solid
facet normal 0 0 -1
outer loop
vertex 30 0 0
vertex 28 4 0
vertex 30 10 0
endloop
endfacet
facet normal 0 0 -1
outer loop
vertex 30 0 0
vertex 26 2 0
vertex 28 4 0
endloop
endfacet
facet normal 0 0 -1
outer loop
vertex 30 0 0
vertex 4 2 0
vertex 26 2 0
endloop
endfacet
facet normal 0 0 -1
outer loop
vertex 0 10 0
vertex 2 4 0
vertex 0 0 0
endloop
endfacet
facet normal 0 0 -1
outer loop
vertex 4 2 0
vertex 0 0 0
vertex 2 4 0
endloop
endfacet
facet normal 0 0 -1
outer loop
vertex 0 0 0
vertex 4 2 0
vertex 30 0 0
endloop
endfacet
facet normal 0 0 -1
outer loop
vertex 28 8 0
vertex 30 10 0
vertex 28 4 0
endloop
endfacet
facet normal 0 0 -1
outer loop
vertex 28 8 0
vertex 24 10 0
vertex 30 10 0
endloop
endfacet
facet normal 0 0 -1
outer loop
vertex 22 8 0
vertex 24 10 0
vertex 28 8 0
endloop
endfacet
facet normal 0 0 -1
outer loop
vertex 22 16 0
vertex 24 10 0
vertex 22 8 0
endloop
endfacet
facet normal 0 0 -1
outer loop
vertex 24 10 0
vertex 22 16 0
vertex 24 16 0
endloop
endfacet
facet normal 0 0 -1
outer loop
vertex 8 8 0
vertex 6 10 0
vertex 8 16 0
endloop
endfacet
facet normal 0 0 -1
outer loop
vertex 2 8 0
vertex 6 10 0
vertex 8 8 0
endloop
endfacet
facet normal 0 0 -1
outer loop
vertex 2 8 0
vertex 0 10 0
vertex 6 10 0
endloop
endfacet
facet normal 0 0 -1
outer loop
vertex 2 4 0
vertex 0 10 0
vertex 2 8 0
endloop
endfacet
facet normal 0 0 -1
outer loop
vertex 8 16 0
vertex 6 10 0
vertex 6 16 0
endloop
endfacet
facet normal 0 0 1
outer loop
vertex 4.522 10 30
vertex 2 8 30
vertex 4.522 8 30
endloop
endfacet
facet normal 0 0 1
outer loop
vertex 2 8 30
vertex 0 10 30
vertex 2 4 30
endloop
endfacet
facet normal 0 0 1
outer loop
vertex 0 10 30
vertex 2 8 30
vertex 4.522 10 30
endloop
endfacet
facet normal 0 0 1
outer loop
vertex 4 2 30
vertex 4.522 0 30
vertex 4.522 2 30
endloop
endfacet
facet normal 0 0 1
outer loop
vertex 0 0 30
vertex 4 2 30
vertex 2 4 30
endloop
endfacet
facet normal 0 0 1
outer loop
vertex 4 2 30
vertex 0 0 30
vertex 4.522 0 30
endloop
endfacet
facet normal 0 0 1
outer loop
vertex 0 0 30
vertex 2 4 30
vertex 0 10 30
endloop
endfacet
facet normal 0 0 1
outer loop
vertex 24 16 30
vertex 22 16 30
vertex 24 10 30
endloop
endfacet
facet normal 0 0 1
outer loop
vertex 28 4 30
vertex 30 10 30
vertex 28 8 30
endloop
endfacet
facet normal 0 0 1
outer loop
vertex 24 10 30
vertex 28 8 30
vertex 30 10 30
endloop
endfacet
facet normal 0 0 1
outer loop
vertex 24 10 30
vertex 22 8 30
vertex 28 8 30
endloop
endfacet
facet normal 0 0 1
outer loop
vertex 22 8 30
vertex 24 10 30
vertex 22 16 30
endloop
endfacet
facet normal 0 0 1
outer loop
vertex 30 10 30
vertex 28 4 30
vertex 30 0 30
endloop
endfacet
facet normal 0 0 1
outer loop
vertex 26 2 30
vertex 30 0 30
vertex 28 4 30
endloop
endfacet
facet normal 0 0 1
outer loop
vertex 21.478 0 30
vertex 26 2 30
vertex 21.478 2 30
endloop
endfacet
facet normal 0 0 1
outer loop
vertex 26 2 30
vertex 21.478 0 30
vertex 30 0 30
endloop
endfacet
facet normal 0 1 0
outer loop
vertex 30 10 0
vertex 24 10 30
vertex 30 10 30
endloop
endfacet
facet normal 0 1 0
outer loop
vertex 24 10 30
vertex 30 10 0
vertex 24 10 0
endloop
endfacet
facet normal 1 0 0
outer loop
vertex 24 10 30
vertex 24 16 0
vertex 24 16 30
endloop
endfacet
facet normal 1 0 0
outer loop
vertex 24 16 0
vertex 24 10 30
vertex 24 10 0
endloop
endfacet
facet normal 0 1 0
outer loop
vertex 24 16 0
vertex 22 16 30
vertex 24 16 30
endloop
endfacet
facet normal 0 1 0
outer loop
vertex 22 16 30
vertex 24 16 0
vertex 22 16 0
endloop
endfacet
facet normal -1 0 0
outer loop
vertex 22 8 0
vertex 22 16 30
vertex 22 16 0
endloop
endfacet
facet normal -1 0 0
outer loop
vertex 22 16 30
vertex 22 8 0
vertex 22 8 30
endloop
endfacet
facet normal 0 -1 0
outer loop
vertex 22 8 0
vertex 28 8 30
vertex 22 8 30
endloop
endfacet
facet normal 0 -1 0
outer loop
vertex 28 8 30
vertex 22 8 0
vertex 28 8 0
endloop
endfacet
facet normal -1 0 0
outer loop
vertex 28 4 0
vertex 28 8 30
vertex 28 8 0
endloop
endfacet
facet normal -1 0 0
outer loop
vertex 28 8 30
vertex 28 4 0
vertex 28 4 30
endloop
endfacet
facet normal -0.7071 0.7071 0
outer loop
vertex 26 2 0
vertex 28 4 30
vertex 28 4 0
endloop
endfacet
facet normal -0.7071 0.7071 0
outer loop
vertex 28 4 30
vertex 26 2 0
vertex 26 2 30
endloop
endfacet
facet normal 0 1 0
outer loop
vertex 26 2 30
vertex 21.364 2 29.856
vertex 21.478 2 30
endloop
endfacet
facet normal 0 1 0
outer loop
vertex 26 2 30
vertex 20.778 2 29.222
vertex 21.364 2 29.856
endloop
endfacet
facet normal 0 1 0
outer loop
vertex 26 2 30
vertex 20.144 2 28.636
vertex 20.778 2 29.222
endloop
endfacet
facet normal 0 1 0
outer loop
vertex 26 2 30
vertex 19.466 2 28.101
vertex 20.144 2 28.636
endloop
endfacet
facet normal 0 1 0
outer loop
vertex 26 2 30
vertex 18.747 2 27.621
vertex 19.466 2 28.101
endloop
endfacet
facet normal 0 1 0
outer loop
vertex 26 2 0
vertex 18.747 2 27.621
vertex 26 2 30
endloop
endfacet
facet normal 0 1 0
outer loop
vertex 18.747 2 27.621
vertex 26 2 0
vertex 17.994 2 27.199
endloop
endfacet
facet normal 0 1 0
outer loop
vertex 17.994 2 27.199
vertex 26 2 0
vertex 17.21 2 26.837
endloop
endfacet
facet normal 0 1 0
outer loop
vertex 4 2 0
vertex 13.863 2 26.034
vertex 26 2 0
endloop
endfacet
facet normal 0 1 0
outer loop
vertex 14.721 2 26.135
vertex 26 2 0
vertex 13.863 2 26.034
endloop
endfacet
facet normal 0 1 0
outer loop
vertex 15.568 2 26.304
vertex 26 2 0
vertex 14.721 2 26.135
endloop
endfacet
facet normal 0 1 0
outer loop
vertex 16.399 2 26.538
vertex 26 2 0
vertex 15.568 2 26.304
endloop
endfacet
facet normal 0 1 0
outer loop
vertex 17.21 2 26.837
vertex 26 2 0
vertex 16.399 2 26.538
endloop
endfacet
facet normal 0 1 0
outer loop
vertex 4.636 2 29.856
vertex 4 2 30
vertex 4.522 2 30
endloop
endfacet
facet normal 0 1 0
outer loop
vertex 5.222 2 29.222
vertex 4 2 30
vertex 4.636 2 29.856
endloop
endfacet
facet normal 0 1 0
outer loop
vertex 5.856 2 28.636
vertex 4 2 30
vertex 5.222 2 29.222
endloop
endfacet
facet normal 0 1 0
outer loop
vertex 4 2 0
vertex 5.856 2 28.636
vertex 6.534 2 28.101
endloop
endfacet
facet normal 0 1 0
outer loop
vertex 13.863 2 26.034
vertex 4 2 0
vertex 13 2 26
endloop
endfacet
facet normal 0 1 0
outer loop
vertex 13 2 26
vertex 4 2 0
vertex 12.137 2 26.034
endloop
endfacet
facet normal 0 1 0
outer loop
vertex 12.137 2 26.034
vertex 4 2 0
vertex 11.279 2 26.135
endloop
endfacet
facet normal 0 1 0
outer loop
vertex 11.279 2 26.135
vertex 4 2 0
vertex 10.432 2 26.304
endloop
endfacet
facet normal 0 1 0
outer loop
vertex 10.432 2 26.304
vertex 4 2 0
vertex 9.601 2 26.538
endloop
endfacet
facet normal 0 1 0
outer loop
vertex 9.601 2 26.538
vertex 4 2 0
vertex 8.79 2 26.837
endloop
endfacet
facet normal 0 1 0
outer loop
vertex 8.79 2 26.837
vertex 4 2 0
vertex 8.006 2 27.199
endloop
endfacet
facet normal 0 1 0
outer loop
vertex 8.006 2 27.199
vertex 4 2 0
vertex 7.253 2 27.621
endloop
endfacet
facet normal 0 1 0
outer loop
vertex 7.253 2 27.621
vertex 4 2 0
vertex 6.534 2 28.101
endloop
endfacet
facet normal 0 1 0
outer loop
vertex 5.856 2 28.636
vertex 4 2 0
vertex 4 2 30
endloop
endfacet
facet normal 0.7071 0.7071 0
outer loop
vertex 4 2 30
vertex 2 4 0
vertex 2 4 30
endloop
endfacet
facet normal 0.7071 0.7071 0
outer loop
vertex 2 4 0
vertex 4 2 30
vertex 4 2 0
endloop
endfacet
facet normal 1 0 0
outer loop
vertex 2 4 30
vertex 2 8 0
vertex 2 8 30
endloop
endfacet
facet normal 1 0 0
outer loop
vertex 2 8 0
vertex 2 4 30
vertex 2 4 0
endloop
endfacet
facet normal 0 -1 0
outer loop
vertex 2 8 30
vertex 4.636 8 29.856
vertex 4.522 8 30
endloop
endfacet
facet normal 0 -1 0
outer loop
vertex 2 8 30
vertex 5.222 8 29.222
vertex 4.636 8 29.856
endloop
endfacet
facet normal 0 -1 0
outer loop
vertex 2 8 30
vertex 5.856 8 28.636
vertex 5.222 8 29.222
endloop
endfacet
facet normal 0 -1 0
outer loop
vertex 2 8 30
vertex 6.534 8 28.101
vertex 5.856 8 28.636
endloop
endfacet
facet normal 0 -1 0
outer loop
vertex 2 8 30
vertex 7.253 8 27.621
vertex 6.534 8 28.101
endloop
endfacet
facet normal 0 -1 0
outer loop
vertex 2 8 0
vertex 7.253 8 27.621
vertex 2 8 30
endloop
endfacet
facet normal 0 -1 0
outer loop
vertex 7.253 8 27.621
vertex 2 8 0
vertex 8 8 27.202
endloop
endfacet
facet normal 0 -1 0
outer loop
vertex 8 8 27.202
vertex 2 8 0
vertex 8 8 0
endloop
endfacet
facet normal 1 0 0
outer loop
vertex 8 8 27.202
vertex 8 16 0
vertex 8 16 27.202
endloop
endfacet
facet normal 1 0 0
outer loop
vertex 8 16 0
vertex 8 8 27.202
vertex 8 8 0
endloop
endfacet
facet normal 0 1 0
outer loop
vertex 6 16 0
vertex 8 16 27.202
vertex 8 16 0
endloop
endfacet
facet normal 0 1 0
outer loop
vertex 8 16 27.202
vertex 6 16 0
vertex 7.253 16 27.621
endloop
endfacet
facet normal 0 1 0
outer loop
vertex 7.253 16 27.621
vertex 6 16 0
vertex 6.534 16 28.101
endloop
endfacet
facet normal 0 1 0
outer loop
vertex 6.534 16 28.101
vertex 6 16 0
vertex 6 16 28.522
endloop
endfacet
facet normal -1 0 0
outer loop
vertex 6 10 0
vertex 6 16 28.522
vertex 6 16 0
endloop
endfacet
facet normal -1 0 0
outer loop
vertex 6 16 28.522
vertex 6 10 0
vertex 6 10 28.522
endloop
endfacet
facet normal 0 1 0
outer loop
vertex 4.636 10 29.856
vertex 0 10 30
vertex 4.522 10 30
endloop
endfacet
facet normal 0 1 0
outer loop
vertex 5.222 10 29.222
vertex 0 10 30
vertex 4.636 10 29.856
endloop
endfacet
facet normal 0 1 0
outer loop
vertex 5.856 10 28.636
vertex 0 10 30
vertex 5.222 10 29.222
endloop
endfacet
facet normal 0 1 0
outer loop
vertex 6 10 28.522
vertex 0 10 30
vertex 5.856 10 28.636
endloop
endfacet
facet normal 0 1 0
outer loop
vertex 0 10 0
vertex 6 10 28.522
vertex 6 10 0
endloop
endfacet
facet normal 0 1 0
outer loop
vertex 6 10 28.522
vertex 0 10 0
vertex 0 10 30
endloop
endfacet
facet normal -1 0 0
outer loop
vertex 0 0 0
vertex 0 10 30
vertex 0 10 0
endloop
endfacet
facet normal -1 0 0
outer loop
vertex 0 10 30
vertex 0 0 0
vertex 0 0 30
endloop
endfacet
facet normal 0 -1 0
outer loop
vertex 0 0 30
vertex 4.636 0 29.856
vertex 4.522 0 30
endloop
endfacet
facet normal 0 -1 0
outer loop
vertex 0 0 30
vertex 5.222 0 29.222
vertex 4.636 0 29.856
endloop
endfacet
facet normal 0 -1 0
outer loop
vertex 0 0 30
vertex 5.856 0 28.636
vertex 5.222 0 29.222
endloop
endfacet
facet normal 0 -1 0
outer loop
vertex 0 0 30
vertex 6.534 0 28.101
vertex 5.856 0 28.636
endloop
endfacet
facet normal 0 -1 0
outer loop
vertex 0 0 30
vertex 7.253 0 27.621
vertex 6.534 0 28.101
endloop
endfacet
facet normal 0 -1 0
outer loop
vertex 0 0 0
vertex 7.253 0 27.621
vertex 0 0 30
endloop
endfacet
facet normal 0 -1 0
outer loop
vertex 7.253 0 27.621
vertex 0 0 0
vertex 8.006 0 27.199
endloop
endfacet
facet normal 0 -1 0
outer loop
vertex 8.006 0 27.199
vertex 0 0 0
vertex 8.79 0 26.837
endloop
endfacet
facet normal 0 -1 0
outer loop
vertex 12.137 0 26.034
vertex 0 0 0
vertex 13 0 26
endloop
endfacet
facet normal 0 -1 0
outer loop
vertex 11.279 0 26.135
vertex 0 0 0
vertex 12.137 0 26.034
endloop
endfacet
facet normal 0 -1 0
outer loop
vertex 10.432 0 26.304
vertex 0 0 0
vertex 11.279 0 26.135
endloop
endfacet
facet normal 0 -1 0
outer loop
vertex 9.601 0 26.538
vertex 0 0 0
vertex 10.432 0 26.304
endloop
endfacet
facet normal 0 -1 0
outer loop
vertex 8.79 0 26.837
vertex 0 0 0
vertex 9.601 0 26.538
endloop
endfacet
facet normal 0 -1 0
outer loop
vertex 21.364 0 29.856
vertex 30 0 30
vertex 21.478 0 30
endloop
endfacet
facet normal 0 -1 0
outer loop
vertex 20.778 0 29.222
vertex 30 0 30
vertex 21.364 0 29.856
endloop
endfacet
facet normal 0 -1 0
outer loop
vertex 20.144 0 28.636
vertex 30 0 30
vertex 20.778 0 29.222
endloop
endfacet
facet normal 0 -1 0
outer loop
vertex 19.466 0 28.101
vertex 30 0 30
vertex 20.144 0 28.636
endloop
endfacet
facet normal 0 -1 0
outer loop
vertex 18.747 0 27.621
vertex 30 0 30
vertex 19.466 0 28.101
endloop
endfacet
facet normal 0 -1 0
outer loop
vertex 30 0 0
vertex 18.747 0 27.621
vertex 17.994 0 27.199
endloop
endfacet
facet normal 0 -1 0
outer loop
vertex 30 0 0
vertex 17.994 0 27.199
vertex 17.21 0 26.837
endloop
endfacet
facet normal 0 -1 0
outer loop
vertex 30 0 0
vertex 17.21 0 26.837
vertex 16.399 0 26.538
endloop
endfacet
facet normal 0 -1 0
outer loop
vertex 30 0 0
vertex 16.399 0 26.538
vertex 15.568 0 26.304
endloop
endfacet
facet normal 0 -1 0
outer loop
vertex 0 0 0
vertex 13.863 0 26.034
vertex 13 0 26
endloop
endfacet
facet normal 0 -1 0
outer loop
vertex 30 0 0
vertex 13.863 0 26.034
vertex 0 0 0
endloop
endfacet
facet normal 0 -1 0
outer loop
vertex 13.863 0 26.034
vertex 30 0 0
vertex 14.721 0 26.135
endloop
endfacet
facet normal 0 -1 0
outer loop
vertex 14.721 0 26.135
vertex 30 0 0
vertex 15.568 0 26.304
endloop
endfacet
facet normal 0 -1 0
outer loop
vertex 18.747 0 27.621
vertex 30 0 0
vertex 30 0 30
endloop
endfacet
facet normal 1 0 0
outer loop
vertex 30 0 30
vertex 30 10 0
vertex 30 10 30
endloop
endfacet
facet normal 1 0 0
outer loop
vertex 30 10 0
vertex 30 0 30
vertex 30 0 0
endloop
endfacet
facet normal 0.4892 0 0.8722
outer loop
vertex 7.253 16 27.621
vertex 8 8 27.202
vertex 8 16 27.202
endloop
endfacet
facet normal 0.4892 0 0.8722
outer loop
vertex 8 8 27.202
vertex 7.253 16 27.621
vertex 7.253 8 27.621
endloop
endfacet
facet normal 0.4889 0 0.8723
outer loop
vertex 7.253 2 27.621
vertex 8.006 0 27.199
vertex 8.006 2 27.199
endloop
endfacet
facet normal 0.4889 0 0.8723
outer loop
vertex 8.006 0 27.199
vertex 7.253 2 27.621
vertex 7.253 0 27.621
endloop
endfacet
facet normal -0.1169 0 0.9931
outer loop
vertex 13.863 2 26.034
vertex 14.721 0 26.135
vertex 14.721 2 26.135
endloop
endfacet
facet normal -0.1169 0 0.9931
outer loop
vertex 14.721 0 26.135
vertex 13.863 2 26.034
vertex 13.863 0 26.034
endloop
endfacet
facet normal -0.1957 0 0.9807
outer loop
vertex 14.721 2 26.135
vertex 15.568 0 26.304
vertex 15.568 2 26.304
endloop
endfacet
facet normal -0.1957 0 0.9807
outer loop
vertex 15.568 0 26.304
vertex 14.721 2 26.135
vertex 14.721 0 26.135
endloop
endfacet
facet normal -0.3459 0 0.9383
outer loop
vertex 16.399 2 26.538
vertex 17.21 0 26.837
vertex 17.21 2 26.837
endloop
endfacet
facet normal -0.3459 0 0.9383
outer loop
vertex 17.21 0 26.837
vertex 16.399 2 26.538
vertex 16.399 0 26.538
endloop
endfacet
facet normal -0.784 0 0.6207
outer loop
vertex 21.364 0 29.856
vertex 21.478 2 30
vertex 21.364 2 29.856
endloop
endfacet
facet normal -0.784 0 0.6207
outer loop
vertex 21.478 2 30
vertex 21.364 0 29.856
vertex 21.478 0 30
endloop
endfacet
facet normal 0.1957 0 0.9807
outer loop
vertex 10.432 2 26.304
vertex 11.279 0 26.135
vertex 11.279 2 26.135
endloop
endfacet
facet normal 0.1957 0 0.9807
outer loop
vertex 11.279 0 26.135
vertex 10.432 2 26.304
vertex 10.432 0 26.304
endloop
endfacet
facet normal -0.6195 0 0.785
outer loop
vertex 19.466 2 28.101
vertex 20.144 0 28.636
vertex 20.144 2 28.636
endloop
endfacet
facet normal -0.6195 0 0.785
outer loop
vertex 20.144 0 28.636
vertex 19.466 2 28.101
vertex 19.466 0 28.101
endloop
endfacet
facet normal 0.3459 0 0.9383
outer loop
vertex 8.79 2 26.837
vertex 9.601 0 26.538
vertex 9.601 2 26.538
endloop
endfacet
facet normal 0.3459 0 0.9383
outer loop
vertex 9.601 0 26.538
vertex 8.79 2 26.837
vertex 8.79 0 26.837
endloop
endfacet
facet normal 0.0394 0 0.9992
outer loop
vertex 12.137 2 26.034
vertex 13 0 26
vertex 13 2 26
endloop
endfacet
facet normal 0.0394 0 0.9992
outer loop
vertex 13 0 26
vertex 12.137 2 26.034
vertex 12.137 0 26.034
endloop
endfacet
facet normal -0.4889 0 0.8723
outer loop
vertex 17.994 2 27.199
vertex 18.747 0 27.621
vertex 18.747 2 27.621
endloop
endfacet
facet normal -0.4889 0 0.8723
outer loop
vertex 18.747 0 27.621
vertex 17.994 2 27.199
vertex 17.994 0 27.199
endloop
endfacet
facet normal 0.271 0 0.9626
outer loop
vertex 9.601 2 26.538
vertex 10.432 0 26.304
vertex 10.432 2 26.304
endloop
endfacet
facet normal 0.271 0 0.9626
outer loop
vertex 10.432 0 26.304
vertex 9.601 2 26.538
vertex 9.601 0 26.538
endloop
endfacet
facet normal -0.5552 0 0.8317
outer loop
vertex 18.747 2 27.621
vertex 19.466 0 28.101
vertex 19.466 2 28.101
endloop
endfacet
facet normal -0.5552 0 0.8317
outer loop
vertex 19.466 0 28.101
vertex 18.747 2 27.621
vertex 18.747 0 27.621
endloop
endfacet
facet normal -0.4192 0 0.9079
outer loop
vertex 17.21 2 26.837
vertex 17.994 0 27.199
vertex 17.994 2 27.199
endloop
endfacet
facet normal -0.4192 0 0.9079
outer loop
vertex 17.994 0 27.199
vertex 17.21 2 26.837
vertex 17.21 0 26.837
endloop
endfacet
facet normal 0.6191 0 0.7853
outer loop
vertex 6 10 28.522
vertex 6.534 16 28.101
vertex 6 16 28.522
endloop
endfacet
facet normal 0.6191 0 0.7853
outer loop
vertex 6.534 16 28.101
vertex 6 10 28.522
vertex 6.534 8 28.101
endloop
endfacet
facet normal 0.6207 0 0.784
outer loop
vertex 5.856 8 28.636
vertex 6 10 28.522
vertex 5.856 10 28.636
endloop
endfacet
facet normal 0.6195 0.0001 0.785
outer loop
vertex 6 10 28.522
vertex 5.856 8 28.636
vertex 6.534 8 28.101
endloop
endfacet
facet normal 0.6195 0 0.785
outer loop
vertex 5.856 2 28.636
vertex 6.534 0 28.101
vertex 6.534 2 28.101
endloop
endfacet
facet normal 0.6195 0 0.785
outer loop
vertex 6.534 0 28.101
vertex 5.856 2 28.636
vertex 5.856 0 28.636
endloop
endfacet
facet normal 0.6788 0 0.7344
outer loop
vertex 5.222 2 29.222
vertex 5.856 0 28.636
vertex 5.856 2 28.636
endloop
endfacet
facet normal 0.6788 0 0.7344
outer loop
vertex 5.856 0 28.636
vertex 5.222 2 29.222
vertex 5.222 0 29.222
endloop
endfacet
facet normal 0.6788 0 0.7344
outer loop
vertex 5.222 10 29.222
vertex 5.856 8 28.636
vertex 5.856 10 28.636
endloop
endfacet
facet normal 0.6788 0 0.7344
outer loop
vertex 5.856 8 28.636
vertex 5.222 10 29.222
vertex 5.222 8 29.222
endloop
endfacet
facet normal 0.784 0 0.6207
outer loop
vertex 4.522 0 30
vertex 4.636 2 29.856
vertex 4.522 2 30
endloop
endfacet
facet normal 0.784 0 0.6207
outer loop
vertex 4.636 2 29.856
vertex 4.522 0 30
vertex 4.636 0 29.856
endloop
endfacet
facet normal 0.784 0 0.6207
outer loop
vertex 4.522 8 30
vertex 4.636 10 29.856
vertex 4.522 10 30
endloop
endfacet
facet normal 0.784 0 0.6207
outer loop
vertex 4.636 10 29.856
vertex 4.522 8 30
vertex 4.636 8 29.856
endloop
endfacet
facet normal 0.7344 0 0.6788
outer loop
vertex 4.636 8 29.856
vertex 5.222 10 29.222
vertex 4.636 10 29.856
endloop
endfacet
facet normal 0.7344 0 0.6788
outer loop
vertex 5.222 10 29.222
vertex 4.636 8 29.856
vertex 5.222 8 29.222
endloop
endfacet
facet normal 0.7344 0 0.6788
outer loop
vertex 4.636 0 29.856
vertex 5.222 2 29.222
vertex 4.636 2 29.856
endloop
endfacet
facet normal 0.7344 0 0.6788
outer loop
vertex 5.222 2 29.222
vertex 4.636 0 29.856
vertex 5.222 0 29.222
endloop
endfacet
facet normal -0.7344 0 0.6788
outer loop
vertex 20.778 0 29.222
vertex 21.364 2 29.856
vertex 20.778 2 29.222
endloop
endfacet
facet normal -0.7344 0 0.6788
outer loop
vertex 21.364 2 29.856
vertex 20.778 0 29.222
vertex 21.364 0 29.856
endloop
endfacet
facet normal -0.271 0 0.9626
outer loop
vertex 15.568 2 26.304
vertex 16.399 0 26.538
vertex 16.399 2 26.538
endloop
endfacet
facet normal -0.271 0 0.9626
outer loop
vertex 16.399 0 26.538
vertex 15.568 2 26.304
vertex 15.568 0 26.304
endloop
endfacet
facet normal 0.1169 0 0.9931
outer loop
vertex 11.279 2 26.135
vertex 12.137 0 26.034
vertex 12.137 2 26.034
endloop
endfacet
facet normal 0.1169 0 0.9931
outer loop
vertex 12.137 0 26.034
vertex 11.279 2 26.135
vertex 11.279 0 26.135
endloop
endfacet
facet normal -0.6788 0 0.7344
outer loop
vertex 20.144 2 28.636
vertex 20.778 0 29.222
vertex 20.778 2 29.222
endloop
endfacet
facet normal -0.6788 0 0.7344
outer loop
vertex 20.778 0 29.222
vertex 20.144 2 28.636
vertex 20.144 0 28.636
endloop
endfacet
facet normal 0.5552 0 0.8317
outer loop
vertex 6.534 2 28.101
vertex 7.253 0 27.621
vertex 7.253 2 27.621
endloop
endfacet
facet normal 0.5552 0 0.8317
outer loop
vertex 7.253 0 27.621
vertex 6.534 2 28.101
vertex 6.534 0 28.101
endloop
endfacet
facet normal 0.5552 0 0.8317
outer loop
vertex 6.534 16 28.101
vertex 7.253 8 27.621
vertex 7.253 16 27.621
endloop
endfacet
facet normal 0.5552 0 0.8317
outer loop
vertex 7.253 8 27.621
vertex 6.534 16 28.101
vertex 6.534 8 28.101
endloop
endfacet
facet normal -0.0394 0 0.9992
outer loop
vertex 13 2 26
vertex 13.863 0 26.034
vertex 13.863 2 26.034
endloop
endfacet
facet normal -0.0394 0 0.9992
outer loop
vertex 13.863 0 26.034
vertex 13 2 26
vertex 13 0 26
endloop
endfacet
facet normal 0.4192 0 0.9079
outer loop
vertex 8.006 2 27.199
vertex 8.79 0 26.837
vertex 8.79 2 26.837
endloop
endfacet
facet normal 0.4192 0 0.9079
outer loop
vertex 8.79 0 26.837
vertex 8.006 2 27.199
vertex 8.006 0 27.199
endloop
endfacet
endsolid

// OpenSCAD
//fun holder

points=[[6,16],[6,10],[0,10],[0,0],[30,0],[30,10],[24,10],[24,16],[22,16],[22,8],[28,8],[28,4],[26,2],[4,2],[2,4],[2,8],[8,8],[8,16]];

solid_paths=[[0,1,2,3,4,5,6,7]];

paths=[[0,1,2,3,4,5,6,7,8,9,10,11,12,13,14,15,16,17]];



difference()
{
 linear_extrude(height = 30, center = false, convexity = 10, twist = 0)
 polygon(points, paths,convexity=10);
 $fn=80;
    //powinno byc 15,17,37 ale grzalka nie jest symetrycznie tutaj
 translate([13,17,37]) rotate([90,0,0])cylinder(34,11,11);
}
